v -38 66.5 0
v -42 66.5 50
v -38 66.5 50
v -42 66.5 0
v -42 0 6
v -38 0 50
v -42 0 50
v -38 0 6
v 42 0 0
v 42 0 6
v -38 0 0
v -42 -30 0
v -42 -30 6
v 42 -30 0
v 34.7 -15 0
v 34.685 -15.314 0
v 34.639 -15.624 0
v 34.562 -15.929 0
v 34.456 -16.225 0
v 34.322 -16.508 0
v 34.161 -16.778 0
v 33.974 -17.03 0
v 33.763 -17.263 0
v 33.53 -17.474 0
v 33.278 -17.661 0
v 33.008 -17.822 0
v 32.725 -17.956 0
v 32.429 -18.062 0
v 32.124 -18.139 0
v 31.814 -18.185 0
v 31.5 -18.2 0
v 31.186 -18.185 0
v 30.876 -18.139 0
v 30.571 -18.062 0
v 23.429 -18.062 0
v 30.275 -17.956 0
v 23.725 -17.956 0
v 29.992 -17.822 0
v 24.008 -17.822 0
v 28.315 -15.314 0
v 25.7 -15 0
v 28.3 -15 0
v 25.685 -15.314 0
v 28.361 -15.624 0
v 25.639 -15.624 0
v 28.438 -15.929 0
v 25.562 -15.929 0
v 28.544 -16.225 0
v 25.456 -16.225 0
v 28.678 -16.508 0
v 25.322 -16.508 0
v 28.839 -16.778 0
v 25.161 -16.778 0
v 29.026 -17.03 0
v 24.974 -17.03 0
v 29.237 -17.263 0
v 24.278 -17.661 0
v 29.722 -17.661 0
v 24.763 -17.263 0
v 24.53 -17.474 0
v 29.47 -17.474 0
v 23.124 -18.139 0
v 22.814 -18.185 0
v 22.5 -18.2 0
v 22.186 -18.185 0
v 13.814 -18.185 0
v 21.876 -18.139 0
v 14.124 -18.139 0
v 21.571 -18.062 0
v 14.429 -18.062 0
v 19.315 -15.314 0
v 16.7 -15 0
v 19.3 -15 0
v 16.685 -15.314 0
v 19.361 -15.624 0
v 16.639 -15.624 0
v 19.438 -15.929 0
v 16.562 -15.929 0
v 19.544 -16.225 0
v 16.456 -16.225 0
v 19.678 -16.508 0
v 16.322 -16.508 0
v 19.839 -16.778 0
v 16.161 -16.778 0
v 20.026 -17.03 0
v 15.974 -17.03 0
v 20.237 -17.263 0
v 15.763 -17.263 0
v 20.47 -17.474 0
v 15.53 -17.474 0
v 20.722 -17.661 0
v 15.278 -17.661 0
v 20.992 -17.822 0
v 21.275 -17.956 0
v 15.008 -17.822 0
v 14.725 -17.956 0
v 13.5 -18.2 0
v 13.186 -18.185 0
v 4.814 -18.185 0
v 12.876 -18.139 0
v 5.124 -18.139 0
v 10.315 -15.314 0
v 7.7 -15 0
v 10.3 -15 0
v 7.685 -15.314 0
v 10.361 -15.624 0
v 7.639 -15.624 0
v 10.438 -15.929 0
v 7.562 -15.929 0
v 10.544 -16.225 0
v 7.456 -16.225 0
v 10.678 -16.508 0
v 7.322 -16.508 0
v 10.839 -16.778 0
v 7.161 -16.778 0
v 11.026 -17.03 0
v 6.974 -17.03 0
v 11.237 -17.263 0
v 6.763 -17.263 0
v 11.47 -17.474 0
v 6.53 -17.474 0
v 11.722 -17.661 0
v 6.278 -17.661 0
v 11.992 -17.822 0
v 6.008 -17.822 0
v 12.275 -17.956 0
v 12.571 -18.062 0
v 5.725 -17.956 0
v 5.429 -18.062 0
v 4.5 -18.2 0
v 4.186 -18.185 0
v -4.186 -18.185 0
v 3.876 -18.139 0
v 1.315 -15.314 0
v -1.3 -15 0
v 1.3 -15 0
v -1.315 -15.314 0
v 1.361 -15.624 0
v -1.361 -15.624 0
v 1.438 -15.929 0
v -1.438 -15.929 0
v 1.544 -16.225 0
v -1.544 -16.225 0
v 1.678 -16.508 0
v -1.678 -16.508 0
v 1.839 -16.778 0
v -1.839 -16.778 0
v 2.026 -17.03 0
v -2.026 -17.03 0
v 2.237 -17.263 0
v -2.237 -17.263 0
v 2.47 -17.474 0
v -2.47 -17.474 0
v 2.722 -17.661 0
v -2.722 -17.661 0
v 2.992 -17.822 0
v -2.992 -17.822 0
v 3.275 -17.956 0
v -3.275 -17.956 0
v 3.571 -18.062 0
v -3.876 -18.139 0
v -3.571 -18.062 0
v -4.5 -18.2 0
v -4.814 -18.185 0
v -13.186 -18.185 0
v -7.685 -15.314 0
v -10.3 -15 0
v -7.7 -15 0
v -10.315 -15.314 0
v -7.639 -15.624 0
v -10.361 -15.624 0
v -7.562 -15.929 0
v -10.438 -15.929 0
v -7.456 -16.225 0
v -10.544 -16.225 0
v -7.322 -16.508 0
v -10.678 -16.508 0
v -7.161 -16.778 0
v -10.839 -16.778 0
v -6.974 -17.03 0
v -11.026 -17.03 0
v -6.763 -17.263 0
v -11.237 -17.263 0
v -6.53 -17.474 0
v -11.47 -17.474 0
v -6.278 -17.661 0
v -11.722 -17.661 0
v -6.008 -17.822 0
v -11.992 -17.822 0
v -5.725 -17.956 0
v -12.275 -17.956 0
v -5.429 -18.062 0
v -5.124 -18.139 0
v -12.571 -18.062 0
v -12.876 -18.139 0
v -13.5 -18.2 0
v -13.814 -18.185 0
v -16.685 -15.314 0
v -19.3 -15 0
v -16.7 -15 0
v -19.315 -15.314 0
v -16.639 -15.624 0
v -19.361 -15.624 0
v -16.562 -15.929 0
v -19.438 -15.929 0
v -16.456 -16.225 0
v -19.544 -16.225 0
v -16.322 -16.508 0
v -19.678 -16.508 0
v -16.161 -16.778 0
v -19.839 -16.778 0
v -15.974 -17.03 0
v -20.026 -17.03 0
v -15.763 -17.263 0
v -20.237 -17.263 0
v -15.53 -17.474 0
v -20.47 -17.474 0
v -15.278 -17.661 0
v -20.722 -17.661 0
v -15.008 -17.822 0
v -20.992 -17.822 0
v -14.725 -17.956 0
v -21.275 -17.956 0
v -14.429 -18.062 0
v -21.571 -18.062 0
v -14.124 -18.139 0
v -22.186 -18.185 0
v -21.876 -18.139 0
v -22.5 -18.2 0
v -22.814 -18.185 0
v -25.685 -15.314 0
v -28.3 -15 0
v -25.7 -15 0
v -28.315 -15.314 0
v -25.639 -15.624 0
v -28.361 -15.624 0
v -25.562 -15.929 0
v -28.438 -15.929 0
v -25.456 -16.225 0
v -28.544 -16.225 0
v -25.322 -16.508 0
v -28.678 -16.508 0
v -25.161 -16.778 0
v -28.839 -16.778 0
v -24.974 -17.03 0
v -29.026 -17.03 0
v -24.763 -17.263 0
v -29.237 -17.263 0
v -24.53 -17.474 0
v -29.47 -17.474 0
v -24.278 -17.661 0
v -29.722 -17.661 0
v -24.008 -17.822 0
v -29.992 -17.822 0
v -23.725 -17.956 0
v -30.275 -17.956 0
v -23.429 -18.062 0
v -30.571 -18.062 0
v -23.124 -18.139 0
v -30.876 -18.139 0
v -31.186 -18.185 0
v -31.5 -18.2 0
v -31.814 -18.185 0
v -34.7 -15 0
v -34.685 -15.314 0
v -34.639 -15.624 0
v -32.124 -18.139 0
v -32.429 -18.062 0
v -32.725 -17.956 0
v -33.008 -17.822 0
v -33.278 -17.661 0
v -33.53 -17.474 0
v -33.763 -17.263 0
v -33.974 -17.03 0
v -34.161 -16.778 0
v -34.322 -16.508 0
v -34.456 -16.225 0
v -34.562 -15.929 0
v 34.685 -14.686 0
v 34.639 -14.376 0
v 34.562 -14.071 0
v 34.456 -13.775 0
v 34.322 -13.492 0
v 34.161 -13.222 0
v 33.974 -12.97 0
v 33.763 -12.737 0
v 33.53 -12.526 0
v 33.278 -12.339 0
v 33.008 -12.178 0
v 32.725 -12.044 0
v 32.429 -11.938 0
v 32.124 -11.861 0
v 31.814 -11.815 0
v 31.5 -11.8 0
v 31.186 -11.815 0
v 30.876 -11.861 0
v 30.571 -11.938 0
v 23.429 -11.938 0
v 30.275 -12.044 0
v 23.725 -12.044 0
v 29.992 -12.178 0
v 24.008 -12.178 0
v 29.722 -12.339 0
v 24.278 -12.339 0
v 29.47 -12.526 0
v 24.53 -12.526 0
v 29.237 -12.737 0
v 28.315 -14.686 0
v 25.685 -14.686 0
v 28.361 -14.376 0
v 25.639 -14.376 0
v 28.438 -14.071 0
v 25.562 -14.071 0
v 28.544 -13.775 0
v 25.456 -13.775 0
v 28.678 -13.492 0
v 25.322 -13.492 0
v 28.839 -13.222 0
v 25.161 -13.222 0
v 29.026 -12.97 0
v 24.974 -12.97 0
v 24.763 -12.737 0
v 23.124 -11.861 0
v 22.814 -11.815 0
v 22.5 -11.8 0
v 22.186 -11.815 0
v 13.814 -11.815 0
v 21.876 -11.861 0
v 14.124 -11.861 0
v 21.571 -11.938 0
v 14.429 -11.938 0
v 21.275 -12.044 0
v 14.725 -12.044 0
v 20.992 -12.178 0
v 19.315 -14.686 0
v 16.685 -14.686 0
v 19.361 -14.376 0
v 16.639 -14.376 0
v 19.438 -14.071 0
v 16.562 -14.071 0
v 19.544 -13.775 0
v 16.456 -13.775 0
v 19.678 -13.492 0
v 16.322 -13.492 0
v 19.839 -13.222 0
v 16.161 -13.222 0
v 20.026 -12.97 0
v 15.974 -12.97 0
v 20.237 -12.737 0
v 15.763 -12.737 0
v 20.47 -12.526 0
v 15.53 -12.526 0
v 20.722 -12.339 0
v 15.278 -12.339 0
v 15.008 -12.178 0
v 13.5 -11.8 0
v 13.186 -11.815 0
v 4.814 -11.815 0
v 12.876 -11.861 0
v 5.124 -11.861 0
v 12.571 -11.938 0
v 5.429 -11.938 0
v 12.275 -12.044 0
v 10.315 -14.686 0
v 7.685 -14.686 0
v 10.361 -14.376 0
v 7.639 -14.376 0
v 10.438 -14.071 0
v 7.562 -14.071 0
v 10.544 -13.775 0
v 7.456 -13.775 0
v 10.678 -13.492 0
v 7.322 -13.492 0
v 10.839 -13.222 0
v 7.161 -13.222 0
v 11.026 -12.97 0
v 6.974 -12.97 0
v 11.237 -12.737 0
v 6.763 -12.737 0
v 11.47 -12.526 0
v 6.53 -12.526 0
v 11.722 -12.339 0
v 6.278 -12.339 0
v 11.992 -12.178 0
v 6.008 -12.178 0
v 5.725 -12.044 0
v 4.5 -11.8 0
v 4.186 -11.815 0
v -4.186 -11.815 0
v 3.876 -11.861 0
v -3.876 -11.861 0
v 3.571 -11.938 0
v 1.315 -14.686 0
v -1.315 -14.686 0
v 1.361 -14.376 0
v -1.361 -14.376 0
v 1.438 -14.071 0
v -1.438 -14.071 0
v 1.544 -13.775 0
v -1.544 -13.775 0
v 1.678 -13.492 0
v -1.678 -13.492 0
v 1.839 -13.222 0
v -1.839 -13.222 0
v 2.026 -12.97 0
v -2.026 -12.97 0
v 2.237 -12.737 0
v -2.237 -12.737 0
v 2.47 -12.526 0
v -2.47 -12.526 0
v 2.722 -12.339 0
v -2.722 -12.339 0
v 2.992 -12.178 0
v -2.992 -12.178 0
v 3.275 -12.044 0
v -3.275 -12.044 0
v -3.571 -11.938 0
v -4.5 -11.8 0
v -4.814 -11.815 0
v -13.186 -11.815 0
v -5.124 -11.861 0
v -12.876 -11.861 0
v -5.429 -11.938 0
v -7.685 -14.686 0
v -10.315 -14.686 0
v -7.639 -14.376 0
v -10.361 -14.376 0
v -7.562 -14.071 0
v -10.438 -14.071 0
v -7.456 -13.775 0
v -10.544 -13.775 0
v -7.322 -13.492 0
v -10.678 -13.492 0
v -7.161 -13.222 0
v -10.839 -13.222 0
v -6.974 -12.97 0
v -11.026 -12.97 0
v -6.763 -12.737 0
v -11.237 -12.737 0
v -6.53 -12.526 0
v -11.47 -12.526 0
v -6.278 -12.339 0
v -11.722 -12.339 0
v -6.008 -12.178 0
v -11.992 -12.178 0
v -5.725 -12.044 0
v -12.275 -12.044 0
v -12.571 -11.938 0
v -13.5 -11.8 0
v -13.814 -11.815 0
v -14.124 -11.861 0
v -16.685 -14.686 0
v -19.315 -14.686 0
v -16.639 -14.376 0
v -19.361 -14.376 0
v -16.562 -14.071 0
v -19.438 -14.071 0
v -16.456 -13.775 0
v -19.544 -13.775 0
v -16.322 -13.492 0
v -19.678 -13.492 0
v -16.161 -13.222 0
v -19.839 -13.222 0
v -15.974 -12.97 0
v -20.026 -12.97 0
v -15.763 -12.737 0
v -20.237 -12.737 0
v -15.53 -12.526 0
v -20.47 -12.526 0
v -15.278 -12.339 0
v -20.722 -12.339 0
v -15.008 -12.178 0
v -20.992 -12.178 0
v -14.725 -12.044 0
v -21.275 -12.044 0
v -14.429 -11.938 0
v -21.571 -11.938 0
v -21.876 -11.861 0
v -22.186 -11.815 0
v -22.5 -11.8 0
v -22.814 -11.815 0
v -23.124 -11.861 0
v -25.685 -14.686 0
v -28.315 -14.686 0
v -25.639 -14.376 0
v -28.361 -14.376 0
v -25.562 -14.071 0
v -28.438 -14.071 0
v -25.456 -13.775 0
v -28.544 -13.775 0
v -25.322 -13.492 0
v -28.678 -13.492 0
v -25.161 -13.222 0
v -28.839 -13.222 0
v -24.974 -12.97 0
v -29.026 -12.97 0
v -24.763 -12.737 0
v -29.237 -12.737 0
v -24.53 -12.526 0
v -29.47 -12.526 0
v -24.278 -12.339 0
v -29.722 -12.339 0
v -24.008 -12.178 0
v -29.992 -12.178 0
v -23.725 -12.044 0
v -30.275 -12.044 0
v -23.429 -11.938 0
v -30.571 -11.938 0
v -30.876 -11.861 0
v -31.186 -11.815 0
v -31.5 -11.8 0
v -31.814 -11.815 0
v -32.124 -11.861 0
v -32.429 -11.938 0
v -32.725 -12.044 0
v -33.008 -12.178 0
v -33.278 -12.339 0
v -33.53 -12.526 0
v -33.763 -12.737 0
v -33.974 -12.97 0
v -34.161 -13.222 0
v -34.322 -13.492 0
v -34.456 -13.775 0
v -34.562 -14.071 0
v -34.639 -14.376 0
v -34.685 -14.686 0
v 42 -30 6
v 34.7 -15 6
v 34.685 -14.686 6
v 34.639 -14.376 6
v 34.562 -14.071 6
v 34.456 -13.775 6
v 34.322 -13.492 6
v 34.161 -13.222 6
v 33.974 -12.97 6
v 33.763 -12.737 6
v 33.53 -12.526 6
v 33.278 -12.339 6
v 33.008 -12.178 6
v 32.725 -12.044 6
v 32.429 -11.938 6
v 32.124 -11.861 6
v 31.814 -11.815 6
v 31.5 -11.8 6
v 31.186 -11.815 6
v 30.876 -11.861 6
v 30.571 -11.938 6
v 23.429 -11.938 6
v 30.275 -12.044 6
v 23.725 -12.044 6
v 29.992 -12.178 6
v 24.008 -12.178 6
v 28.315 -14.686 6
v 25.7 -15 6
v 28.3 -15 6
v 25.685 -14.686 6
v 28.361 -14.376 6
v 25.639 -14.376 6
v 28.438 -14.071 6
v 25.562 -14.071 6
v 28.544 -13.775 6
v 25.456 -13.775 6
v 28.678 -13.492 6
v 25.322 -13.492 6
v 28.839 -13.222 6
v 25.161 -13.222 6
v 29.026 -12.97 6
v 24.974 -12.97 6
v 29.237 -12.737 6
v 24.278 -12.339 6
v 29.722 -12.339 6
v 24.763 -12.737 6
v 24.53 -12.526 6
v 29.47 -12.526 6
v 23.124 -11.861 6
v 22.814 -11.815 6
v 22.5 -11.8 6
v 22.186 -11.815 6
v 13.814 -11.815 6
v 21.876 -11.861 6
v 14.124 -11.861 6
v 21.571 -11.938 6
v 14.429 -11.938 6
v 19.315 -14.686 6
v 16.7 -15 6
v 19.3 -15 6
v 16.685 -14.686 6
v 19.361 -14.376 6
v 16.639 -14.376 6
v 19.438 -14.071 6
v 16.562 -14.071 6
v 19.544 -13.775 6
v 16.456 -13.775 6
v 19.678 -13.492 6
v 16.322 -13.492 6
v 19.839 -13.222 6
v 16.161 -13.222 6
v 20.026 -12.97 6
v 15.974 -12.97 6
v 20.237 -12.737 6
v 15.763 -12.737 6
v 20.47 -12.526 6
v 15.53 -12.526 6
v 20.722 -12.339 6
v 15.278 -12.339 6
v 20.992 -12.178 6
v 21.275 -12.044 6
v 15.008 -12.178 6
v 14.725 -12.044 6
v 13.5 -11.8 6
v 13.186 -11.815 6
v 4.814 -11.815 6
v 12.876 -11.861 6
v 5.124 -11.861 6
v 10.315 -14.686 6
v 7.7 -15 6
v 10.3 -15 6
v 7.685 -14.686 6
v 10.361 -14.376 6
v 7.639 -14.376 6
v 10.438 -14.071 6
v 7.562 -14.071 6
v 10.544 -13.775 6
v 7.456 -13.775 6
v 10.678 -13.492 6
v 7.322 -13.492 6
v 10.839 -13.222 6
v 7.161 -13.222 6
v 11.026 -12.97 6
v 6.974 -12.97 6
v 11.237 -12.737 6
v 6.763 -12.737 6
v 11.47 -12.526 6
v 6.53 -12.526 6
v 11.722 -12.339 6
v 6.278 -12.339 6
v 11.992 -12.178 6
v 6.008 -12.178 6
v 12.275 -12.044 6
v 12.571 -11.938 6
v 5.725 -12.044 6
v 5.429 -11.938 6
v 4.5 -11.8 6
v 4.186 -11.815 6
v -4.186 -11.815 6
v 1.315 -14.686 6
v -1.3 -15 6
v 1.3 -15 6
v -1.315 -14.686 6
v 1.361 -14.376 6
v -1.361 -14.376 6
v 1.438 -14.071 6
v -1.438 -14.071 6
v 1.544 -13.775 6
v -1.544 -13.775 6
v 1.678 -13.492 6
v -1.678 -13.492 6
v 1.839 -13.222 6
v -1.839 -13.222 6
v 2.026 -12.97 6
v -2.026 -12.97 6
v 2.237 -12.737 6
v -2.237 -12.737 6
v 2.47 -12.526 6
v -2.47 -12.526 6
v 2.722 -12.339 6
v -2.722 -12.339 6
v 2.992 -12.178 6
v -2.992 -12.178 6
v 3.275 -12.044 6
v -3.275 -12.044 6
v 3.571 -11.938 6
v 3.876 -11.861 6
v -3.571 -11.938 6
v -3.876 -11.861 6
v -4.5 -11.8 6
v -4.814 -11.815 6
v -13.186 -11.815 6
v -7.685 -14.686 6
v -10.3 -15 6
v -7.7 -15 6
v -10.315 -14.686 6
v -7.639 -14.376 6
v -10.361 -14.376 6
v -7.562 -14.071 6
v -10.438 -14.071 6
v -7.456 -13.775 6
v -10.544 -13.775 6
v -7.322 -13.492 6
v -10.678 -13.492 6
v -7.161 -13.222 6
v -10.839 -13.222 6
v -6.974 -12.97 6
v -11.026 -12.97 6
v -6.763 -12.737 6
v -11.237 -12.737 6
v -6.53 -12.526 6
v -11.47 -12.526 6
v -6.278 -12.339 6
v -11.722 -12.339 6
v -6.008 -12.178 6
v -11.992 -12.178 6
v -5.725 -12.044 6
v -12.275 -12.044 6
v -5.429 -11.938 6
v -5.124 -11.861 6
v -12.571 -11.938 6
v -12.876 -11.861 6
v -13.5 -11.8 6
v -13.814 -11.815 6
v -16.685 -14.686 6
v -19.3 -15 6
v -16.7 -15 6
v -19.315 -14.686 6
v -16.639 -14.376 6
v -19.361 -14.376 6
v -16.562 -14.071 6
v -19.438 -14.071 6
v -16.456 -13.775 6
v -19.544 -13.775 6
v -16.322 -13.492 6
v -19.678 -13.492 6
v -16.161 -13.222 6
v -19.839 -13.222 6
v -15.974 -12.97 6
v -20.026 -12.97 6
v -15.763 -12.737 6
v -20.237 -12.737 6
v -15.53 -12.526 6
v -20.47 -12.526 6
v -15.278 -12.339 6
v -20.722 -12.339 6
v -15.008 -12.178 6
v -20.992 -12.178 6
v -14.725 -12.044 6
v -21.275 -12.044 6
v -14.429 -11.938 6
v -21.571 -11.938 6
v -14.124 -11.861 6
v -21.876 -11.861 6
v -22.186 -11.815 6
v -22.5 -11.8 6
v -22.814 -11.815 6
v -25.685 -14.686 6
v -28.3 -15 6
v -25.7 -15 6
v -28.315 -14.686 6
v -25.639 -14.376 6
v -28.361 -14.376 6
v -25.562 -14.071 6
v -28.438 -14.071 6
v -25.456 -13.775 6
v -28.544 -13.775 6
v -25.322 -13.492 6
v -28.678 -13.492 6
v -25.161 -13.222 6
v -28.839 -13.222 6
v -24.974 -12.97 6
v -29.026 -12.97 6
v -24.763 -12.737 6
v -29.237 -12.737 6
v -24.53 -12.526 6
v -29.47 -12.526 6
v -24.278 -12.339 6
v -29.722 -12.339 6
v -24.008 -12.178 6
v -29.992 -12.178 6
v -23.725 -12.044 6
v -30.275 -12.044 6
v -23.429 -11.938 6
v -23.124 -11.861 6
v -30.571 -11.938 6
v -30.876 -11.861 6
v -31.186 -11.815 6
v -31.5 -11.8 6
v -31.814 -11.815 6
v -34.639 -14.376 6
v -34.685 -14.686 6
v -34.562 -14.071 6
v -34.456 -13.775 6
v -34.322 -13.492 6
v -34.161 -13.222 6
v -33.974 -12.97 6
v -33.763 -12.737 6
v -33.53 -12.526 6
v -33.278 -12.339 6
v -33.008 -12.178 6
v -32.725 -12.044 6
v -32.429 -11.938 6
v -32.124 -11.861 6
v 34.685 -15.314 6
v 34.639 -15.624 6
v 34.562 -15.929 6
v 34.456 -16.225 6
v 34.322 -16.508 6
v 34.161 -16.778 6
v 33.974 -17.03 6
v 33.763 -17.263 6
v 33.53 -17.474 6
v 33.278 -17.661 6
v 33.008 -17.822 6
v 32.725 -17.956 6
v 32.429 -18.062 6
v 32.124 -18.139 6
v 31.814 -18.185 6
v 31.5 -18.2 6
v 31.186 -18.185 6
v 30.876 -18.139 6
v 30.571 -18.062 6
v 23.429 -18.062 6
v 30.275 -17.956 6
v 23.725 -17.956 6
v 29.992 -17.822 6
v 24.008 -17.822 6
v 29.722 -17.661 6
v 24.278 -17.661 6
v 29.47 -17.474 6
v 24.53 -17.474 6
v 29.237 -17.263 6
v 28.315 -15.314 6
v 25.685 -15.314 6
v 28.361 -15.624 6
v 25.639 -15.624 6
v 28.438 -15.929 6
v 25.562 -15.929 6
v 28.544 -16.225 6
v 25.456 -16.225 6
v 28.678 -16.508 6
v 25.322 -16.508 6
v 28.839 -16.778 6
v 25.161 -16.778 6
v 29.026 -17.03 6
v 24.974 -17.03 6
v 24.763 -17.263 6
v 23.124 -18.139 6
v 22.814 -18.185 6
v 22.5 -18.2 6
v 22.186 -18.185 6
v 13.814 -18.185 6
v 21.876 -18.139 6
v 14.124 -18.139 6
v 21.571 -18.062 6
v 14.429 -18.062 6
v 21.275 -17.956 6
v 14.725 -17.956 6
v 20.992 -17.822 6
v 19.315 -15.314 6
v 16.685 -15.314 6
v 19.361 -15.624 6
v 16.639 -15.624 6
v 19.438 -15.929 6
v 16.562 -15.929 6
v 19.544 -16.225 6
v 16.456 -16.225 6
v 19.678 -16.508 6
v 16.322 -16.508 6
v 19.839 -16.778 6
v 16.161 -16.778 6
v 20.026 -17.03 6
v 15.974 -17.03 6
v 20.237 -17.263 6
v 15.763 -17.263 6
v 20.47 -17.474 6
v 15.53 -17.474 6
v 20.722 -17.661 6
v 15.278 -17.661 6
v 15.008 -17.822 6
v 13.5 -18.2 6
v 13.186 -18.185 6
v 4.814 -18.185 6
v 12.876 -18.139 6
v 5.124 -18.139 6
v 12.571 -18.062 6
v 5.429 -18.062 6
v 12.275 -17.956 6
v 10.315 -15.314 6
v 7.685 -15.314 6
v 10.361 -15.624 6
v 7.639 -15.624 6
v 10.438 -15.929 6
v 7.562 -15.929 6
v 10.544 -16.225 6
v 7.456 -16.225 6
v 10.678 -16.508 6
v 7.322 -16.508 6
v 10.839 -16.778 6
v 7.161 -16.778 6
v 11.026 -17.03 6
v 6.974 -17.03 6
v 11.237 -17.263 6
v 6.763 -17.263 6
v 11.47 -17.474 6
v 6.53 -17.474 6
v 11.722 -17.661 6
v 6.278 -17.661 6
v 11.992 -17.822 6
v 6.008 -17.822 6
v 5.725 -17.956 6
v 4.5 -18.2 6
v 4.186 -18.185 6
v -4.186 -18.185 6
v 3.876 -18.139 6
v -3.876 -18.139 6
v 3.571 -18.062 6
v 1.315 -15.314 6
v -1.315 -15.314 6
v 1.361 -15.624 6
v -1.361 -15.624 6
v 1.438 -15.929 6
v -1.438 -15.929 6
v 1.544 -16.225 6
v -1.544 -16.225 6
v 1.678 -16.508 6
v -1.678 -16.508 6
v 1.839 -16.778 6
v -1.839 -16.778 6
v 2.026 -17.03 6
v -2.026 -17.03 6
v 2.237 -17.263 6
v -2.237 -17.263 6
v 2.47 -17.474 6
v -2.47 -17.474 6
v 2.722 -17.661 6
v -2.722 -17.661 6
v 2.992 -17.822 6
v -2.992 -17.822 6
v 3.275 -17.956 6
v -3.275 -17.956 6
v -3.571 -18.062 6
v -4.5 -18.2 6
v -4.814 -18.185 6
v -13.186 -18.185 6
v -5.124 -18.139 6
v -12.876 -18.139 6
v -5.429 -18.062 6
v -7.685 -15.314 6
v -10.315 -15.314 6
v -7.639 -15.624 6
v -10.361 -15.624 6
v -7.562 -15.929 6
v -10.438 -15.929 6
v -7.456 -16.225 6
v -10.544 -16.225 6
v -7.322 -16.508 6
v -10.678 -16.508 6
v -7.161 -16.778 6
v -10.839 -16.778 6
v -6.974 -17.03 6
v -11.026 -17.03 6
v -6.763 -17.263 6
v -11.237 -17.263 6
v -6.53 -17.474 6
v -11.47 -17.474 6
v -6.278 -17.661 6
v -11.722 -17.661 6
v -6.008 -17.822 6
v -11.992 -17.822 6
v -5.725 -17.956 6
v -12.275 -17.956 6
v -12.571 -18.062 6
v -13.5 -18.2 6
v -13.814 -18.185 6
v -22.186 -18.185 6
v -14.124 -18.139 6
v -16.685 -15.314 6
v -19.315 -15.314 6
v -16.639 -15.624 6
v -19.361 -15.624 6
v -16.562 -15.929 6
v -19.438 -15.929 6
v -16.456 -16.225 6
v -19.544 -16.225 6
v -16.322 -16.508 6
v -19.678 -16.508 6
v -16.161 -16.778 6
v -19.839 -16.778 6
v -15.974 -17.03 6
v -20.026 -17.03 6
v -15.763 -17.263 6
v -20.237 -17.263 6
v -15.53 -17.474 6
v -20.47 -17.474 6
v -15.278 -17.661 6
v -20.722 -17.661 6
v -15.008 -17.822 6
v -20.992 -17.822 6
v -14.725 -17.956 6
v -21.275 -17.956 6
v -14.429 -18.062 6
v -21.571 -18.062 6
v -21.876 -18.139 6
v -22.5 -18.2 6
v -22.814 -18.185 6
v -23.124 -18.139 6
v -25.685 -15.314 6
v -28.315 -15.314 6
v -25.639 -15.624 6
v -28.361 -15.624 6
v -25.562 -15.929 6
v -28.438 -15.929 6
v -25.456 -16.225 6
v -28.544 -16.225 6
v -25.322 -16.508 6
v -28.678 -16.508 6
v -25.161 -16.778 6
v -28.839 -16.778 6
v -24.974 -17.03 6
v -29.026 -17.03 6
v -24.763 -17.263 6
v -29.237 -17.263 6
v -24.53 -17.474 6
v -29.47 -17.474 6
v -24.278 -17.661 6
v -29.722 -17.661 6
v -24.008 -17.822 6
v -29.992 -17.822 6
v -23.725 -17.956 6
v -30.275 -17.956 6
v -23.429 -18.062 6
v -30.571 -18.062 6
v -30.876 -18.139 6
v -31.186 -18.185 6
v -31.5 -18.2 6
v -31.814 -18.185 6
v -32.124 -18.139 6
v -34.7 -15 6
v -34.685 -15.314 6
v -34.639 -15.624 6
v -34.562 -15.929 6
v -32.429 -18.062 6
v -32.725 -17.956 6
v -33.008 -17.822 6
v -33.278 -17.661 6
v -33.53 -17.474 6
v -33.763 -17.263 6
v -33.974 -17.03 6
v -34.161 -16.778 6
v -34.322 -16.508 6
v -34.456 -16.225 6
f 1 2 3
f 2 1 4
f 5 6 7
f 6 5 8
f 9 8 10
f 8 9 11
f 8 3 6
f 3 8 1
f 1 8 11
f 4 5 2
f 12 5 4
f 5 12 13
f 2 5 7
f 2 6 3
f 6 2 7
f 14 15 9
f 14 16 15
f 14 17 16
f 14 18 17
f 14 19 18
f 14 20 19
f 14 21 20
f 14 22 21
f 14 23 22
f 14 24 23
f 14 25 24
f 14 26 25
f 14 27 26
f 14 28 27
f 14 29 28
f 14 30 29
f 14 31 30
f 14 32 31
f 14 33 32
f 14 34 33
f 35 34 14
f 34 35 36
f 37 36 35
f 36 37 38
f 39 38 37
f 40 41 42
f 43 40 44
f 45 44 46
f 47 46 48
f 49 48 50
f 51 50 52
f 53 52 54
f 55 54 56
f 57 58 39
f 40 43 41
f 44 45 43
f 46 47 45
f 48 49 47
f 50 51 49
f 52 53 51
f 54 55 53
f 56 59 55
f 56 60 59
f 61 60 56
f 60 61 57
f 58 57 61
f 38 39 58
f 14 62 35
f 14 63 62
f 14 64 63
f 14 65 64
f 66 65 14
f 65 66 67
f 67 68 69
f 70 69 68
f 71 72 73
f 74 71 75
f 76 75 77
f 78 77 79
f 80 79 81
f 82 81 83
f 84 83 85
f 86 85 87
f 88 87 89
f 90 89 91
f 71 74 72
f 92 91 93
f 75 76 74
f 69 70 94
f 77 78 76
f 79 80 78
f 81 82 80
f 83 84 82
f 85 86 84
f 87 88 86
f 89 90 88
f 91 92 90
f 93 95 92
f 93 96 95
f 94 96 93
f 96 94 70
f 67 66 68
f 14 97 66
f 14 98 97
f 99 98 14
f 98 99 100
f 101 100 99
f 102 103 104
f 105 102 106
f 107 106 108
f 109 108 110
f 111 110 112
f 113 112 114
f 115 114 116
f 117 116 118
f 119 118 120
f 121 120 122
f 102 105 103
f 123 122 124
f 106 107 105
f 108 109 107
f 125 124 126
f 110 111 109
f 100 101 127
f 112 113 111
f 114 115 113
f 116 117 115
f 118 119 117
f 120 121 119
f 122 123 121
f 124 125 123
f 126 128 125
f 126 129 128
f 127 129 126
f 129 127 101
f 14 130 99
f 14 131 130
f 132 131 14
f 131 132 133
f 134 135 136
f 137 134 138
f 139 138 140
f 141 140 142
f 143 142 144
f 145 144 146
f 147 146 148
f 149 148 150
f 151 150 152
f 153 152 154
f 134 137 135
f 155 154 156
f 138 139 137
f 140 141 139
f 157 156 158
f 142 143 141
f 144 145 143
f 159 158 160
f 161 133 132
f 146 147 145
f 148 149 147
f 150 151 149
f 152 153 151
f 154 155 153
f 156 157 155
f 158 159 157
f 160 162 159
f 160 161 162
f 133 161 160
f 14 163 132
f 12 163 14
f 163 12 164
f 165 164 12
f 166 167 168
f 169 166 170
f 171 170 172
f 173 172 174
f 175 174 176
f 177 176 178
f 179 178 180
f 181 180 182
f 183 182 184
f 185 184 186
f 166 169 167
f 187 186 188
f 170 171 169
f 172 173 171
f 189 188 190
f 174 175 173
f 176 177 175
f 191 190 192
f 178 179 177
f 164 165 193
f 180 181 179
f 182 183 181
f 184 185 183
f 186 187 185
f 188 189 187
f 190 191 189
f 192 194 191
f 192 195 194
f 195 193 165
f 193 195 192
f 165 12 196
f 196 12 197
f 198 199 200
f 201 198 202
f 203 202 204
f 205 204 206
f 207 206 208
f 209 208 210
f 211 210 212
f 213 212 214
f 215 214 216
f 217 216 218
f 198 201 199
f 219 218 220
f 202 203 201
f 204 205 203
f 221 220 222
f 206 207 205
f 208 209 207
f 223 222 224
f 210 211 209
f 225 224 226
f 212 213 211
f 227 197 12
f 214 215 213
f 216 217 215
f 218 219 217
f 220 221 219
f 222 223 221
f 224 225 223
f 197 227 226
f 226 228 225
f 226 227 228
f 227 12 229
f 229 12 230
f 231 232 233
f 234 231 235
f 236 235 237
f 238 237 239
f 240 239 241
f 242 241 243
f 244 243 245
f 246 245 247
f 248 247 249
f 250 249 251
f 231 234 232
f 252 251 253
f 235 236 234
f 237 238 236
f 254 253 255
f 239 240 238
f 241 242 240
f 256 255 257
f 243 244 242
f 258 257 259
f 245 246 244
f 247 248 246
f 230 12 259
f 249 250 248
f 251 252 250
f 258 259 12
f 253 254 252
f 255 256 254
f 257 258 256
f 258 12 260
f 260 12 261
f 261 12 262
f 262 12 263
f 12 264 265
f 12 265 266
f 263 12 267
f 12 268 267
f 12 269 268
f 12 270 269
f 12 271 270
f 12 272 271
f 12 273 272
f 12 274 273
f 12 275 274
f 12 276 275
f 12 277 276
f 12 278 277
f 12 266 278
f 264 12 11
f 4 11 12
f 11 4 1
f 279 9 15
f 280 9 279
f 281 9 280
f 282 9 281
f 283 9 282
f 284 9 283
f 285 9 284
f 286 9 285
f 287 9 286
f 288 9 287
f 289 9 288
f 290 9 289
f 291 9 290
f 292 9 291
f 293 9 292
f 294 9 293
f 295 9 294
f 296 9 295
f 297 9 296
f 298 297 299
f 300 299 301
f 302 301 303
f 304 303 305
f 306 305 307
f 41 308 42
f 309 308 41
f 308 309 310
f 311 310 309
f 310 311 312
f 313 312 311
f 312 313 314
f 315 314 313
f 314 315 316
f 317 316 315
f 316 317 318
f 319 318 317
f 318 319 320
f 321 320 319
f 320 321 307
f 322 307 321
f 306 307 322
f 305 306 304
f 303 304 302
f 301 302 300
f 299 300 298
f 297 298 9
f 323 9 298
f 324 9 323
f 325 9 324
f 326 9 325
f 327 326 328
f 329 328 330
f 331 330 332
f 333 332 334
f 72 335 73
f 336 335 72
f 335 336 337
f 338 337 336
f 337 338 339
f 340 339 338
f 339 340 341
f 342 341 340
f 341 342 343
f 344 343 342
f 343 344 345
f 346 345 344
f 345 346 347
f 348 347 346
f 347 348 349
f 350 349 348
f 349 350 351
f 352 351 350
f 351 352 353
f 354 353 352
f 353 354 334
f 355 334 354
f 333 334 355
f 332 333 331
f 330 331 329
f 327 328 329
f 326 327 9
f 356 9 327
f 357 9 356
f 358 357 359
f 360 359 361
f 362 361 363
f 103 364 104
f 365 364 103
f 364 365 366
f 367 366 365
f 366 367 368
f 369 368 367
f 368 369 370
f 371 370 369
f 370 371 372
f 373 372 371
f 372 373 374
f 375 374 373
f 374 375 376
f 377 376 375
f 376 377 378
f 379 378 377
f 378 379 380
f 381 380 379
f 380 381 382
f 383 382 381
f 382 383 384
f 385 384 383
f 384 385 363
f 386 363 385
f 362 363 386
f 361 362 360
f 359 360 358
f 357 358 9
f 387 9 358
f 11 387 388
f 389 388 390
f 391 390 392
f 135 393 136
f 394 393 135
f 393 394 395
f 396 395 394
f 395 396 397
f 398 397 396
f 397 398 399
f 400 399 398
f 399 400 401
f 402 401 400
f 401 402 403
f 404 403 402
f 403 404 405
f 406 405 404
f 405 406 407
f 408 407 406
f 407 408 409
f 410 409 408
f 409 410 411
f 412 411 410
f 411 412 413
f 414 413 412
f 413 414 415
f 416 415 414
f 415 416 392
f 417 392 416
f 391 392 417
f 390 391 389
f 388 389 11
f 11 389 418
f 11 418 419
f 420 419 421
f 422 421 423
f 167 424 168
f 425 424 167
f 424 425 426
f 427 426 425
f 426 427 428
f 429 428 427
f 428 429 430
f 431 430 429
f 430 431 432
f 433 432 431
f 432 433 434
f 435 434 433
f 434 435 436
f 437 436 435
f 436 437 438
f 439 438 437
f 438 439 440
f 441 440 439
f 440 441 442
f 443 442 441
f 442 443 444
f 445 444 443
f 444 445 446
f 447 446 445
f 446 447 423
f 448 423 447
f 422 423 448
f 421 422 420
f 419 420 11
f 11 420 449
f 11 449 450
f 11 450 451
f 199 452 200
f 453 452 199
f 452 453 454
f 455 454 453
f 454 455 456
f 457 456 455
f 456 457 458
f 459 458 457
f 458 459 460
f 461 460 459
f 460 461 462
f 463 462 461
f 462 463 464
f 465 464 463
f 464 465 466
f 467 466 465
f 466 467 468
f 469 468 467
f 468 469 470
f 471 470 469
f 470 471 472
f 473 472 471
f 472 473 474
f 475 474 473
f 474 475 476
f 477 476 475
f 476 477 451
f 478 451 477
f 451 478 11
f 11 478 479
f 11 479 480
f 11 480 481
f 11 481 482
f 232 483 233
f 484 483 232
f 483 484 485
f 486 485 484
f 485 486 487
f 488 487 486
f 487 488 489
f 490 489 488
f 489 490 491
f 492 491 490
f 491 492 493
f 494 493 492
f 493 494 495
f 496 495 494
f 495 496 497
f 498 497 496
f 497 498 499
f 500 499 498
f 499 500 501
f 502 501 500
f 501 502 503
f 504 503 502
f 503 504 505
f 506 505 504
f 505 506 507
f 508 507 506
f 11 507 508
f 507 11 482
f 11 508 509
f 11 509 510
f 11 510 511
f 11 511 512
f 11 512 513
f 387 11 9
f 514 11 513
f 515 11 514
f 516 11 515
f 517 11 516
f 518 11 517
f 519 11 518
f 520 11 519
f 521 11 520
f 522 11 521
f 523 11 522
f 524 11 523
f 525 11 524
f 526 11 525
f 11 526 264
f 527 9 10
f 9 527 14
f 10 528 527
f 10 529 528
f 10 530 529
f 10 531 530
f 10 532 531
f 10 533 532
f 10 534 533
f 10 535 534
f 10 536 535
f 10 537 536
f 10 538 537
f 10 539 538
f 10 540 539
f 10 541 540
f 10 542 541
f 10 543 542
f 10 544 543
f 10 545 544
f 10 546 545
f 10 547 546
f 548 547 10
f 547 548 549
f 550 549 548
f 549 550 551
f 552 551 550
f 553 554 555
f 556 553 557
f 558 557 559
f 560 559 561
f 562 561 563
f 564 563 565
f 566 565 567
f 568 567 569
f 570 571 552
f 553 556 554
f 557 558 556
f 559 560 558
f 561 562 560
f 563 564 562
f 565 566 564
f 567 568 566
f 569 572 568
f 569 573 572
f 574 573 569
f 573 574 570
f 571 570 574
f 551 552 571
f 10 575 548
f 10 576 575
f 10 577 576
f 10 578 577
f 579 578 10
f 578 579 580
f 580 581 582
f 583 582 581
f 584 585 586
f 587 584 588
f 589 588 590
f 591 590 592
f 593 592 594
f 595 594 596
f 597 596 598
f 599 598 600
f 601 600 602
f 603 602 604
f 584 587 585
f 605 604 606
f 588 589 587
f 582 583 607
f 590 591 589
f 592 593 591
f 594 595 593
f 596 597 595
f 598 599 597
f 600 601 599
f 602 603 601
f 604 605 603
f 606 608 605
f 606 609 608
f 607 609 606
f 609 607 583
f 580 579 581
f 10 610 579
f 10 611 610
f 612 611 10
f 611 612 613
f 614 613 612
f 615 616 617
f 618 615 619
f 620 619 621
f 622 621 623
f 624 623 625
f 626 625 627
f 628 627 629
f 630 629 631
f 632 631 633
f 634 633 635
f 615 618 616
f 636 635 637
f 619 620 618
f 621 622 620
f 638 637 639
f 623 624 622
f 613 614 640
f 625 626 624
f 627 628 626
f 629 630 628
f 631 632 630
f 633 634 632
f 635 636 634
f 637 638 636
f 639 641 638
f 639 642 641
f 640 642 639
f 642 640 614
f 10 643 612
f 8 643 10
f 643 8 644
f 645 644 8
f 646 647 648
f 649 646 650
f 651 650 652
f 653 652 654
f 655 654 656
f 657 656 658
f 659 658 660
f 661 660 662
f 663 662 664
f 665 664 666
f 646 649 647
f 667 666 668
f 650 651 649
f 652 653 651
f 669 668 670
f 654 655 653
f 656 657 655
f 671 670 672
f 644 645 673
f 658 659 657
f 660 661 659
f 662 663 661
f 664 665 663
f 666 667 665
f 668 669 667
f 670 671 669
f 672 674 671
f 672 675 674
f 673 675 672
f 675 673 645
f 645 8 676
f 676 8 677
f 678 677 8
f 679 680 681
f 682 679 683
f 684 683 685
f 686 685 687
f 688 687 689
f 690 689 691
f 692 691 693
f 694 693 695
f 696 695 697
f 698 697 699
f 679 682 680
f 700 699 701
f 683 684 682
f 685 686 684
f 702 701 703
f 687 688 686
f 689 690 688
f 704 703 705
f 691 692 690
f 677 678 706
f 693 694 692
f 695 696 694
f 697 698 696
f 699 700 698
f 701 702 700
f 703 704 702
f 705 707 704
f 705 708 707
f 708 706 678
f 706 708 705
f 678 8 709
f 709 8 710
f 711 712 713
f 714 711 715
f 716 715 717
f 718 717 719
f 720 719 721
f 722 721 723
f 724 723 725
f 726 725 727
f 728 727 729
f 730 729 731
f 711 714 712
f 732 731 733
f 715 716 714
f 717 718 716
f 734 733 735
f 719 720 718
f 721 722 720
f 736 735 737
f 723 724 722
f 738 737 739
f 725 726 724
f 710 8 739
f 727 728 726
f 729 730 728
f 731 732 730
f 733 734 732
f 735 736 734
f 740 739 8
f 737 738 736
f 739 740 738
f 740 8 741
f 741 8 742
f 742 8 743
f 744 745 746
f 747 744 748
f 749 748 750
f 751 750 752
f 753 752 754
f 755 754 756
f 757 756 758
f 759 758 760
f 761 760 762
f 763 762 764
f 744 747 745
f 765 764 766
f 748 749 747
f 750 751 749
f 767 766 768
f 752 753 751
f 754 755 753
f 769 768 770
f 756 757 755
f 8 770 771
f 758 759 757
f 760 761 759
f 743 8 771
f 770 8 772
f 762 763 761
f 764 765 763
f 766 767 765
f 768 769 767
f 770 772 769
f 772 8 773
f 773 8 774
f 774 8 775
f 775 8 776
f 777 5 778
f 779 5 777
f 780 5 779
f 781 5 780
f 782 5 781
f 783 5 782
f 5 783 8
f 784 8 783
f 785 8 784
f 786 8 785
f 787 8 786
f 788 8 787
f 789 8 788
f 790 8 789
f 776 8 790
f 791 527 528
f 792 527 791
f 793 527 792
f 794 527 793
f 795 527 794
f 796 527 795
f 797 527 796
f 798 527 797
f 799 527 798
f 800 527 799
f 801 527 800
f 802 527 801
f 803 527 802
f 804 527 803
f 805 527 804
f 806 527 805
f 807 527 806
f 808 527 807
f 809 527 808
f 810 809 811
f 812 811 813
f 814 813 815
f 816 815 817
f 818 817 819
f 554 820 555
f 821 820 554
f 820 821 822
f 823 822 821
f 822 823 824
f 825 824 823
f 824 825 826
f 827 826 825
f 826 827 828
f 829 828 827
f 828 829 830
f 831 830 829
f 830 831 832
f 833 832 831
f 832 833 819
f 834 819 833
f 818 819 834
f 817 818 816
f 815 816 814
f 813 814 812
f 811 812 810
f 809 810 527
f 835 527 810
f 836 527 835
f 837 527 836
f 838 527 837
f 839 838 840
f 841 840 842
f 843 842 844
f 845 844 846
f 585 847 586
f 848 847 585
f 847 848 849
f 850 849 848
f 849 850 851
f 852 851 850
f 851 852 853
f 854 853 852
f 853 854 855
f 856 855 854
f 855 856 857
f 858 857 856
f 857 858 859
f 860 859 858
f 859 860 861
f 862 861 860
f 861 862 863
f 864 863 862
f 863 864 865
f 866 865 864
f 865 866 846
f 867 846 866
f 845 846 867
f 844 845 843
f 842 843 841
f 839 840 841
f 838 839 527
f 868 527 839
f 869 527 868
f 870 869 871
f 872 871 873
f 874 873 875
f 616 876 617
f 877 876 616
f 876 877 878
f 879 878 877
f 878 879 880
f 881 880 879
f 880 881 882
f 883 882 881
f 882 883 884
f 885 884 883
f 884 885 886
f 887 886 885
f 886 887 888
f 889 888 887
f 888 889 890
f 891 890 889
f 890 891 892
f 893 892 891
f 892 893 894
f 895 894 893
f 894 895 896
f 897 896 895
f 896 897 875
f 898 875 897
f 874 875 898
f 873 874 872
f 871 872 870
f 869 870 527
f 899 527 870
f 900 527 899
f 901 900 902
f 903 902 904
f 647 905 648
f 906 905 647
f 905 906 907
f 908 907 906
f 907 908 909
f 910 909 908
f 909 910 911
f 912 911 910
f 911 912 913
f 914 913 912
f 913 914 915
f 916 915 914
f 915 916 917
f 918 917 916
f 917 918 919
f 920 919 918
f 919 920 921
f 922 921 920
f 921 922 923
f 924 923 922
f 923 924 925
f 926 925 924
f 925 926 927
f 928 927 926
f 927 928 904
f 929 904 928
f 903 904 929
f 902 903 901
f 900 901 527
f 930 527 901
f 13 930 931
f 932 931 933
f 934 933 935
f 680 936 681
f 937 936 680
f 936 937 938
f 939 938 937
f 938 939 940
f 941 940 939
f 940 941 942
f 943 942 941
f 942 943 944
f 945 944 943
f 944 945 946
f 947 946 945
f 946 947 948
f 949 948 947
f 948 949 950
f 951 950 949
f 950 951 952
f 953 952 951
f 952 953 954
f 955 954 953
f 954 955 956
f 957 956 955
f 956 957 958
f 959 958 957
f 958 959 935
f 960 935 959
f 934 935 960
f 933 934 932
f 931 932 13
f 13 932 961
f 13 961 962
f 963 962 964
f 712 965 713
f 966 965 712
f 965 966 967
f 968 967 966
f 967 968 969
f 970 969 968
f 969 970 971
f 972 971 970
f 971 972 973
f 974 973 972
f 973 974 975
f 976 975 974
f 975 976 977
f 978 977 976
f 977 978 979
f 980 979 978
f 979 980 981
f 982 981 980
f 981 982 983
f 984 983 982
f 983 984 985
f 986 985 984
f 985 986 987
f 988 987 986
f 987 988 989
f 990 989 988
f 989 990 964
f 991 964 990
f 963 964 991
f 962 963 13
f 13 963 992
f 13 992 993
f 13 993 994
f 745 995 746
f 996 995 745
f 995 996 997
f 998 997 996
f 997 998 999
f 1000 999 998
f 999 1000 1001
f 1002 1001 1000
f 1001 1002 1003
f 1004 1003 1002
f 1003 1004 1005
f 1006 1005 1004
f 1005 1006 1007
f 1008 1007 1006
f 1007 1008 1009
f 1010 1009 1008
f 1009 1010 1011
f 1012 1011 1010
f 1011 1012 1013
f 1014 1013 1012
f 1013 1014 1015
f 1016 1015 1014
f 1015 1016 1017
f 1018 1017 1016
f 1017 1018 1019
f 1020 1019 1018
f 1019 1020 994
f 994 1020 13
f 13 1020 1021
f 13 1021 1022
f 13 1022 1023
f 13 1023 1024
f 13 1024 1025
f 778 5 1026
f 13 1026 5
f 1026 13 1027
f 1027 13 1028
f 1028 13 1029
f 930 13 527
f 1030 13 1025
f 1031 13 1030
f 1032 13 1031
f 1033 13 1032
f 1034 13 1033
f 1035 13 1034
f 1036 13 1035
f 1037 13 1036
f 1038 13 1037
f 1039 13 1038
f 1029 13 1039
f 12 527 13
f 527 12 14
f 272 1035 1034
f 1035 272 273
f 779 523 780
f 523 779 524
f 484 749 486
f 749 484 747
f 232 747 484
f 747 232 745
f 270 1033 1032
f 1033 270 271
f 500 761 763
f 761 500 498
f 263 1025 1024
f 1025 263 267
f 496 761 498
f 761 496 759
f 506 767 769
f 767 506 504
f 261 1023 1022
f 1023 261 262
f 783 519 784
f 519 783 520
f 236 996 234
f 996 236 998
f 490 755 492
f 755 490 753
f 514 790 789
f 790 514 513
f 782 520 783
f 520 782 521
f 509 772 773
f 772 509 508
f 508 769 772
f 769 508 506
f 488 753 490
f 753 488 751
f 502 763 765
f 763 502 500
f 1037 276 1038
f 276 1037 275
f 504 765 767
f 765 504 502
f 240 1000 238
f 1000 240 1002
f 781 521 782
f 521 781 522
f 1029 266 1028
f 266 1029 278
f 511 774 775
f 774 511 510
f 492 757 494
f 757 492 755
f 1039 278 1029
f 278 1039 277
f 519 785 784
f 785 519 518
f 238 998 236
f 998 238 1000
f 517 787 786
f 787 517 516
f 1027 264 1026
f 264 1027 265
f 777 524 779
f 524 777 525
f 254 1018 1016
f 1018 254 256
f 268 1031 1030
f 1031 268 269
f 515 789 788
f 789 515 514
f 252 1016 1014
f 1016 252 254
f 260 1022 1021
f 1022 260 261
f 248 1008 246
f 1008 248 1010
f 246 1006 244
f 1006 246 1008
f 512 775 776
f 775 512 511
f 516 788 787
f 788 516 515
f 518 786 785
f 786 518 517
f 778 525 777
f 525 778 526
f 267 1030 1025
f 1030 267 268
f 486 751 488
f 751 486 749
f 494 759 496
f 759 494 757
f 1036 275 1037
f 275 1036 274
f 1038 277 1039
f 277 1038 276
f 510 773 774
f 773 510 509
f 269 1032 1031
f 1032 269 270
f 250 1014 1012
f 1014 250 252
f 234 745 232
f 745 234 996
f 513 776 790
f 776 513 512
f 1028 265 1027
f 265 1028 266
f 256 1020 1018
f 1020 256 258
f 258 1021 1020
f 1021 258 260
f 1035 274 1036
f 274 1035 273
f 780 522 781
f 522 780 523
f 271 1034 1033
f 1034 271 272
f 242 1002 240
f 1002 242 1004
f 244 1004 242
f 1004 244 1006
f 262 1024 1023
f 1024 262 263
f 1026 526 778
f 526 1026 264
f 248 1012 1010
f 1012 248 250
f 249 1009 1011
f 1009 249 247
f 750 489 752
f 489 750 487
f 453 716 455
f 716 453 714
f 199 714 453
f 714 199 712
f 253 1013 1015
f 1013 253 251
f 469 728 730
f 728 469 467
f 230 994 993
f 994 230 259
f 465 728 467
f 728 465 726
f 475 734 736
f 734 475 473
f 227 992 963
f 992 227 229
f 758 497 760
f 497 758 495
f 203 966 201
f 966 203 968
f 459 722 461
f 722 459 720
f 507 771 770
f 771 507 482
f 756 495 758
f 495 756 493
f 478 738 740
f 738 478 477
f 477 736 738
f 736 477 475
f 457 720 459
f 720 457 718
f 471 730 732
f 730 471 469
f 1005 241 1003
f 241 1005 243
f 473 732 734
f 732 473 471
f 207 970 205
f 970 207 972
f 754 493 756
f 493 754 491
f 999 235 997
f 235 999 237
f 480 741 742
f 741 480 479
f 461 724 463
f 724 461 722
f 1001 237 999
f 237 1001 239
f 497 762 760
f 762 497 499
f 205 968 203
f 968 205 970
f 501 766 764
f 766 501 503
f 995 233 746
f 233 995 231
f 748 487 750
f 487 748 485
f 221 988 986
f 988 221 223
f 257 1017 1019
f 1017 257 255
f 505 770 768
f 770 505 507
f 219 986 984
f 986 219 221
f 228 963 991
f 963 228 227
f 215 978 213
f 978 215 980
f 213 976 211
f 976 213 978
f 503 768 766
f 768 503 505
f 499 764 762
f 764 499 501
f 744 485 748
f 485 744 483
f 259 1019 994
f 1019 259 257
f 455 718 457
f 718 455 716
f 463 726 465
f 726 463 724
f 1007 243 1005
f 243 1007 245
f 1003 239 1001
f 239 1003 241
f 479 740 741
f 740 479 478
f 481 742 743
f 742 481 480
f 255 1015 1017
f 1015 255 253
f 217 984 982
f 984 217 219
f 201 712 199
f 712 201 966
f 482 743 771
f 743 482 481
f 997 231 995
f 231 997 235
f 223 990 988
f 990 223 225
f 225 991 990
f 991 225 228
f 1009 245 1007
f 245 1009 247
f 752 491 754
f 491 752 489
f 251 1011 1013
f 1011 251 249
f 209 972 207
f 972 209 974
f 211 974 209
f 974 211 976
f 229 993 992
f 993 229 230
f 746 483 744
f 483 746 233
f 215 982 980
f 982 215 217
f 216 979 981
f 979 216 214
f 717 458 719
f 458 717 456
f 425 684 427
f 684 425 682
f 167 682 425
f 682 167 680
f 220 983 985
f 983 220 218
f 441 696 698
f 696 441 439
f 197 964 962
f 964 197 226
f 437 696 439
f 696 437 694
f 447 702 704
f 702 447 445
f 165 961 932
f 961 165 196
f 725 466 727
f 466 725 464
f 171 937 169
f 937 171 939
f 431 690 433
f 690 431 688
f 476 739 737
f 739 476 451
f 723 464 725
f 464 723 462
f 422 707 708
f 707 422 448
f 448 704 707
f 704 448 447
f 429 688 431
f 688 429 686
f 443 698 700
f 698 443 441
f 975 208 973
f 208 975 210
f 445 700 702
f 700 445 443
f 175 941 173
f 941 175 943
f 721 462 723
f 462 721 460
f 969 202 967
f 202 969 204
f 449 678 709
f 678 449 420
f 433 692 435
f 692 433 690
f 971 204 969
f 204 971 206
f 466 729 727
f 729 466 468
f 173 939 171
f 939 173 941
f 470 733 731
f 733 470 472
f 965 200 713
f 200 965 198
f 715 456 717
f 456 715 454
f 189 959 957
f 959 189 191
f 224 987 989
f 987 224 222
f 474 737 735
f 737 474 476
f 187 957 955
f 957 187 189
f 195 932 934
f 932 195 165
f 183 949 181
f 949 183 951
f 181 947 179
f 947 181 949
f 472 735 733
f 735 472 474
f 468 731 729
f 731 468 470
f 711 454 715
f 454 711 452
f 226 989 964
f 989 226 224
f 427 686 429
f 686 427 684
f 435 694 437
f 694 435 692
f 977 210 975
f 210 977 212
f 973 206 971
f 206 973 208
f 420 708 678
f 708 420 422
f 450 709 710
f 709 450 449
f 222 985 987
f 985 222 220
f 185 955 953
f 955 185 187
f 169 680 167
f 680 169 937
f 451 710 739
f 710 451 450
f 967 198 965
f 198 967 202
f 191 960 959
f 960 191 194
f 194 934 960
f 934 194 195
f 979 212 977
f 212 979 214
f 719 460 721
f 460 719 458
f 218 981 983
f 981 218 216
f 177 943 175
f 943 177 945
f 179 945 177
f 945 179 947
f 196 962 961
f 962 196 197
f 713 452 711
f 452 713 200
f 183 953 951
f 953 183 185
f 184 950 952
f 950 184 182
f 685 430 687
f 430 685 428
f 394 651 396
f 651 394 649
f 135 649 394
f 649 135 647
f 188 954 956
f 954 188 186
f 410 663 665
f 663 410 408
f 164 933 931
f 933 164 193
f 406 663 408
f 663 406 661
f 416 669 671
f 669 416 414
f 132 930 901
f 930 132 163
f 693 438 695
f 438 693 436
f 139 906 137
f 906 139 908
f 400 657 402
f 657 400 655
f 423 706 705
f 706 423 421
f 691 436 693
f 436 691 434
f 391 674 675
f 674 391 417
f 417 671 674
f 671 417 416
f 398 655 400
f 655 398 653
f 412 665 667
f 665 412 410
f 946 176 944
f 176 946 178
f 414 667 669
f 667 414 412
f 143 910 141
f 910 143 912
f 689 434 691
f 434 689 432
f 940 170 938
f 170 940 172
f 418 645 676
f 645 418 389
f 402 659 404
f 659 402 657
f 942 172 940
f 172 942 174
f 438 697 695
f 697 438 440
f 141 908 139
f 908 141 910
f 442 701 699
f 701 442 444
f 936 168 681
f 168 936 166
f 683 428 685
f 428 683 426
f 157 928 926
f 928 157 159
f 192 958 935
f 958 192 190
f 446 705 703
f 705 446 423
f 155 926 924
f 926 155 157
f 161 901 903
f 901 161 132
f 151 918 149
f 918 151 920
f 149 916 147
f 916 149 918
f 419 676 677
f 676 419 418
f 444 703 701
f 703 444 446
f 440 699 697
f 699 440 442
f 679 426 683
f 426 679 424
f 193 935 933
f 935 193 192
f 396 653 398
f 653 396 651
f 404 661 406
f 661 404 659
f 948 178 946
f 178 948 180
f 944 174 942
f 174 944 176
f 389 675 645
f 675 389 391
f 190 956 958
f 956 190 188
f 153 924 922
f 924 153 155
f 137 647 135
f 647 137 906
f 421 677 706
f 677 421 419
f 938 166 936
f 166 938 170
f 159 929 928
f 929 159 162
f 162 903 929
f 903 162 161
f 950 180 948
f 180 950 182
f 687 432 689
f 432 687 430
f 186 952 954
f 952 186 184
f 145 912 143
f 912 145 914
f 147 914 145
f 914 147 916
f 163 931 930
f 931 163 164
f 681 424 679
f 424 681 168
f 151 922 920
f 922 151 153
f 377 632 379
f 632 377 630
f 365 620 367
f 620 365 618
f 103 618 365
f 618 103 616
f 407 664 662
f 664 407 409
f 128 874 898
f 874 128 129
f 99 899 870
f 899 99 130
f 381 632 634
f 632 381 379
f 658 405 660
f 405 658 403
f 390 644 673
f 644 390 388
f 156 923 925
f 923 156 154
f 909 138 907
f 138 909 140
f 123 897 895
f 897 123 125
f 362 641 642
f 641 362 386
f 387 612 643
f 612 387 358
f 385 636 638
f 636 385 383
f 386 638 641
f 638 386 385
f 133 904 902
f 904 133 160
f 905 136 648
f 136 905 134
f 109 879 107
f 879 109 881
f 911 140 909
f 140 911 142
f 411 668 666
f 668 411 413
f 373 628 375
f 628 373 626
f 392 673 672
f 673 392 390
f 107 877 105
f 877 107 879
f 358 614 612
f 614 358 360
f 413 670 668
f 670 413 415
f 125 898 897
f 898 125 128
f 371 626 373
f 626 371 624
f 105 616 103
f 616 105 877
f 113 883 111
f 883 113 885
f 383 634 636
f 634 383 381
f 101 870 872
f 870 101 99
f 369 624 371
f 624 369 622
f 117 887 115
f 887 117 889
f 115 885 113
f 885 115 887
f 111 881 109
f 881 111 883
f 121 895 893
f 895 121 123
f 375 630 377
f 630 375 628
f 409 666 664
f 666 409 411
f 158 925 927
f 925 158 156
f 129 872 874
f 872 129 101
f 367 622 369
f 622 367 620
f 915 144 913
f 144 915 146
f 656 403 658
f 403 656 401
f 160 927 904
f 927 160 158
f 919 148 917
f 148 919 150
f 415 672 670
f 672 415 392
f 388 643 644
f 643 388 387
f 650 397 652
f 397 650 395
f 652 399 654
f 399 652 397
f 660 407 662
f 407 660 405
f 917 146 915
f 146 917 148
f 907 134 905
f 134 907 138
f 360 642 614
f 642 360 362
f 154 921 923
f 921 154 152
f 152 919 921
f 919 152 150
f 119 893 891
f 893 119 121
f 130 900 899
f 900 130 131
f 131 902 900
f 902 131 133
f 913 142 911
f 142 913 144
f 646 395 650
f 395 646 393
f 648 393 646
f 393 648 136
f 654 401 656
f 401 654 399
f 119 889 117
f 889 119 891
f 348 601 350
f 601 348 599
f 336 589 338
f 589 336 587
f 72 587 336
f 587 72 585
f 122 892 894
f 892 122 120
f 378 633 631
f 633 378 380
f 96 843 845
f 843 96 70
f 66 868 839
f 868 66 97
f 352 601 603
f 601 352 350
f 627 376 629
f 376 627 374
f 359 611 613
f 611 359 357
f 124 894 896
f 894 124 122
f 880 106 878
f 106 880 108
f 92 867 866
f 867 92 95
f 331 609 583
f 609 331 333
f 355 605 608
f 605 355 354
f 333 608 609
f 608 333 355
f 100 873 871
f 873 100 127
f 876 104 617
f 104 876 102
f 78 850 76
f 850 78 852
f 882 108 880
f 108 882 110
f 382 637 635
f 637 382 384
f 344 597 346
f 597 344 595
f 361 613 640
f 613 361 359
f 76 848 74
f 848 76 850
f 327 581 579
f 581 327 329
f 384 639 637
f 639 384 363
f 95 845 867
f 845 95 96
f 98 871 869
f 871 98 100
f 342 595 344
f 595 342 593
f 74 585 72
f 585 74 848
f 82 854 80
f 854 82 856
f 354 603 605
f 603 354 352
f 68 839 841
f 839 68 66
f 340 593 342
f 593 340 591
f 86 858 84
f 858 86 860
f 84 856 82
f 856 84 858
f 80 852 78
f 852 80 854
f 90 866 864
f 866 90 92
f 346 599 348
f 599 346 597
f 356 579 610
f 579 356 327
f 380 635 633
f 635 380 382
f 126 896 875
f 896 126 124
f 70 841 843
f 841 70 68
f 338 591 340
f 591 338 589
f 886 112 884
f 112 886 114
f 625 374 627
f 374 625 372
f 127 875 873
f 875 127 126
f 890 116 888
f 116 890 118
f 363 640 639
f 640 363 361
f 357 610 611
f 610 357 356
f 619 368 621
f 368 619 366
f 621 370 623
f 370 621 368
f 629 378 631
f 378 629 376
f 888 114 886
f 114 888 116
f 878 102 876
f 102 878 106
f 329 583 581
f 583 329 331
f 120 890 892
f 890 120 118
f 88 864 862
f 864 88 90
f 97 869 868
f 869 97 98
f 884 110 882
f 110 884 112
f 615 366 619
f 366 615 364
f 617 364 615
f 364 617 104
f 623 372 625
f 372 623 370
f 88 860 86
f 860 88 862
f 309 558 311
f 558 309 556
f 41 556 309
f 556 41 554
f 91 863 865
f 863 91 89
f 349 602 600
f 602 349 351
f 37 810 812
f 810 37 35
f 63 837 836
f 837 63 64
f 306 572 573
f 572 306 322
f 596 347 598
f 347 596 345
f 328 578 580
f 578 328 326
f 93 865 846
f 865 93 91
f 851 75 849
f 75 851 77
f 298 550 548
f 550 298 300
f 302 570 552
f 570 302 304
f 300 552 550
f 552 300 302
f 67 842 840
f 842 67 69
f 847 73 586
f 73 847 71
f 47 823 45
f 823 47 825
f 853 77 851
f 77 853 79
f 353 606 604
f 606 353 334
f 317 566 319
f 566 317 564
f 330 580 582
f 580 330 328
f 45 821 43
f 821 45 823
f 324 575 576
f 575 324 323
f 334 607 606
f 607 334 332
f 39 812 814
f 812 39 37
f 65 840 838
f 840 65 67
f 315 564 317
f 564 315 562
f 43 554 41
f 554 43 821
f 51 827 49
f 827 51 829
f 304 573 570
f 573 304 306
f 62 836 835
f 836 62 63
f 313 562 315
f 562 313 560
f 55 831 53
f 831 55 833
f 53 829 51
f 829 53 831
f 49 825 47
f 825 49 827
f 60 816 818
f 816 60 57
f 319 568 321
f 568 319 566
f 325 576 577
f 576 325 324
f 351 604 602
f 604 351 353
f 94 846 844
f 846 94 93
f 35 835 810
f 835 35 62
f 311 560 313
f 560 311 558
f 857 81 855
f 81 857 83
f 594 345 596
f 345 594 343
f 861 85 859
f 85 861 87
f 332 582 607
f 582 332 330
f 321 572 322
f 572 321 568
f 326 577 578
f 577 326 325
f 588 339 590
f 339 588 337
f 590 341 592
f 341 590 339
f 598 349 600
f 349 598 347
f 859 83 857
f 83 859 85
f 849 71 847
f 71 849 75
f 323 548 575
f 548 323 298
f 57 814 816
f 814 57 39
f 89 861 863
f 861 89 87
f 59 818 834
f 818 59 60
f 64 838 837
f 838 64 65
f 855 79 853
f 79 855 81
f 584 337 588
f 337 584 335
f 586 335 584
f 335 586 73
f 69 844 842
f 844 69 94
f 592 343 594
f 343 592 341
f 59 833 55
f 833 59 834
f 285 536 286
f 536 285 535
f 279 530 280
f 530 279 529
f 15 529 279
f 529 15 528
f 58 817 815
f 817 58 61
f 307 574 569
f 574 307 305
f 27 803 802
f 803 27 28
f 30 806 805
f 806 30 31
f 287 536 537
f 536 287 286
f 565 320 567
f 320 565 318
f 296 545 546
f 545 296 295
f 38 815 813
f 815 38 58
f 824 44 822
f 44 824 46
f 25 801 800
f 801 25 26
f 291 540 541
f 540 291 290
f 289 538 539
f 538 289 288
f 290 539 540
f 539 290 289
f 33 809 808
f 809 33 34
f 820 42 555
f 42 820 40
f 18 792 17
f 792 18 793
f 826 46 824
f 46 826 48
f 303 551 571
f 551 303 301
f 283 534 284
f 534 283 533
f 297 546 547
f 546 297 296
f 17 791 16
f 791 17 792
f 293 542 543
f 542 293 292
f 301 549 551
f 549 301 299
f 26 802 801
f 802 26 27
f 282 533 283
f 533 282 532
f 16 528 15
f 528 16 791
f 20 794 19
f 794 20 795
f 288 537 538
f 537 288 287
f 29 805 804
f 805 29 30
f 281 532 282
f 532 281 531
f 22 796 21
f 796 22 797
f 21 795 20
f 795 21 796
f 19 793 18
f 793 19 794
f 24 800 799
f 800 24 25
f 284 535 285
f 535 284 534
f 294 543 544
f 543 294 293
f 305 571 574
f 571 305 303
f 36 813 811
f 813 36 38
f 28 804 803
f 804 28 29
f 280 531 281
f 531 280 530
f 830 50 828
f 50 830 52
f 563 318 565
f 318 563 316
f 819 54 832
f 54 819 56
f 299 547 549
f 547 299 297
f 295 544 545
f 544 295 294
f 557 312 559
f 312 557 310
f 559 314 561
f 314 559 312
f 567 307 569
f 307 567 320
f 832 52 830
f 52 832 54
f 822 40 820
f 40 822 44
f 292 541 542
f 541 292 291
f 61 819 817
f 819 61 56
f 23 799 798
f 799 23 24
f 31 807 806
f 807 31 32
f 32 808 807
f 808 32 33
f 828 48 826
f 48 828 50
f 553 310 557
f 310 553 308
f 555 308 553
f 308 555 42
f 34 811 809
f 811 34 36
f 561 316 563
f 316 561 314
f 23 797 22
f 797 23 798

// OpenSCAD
// --- Dimensions ---
// Overall extrusion length along X
length_x = 84; 

// Wall thickness gap (target 12.5mm)
// Inner leg ends at y=4, Outer leg starts at y=16.5. 
// 16.5 - 4 = 12.5. Correct.
gap_width = 12.5; 

// Leg dimensions
leg_thickness = 4; // User: "inner leg (y = 0 to 4)"
leg_height = 50;

// Bridge dimensions
// User: "joined at the top by a bridge from z = 46 to 50"
bridge_z_start = 46;

// Ledge dimensions
// User: "ledge, 6 mm thick (z = 0 to 6) reaches toward -Y from y = 0 to y = -30"
ledge_thickness = 6;
ledge_depth = 30; 

// Tube hole dimensions
// User: "Eight vertical 6.4 mm through-holes in the ledge... 9 mm apart along X, centred, at y = -15"
hole_diameter = 6.4;
hole_y_pos = -15;
hole_spacing_x = 9;
num_holes = 8;

// --- Parameters ---
$fn = 64;

// --- Modeling ---

// The part is centered on X and Y, resting on Z=0
// The profile is defined in the YZ plane and extruded along X

module profile_extrusion() {
    // We build the U-shape profile and extrude it along X
    // The profile is defined in the YZ plane
    linear_extrude(height = leg_height) {
        union() {
            // Inner Leg: y = 0 to 4, z = 0 to 50
            square([leg_thickness, leg_height]);
            
            // Outer Leg: y = 16.5 to 20.5, z = 0 to 50
            translate([0, 16.5])
                square([leg_thickness, leg_height]);
            
            // Bridge: z = 46 to 50
            // User: "joined at the top by a bridge from z = 46 to 50"
            // This bridge connects the two legs.
            // To ensure it is a single solid, we bridge from y=0 to y=20.5
            translate([0, 0])
                square([leg_thickness, 20.5]);
        }
    }
}

// Final Assembly
// We use difference() to subtract the holes from the union of the body and ledge
difference() {
    union() {
        // 1. The U-profile extruded along X
        // Centered on X: from -42 to 42.
        // The profile starts at y=0.
        translate([-length_x/2, 0, 0])
            profile_extrusion();

        // 2. The Ledge
        // "reaches toward -Y from y = 0 to y = -30"
        // "6 mm thick (z = 0 to 6)"
        // "84 mm long"
        translate([-length_x/2, -ledge_depth, 0])
            cube([length_x, ledge_depth, ledge_thickness]);
    }

    // 3. The Tube Holes
    // "Eight vertical 6.4 mm through-holes in the ledge"
    // "9 mm apart along X, centred, at y = -15"
    // Total span of holes: (8-1) * 9 = 63mm.
    // To center 63mm on X=0: start at -31.5, end at 31.5.
    for (i = [0 : num_holes - 1]) {
        x_pos = -31.5 + (i * hole_spacing_x);
        
        // Subtracting from the ledge
        // We extend the cylinder slightly in Z to ensure a clean cut through the ledge
        translate([x_pos, hole_y_pos, -0.01]) 
            cylinder(h = ledge_thickness + 0.02, d = hole_diameter);
    }
}

// Verification of bounding box logic:
// X: -42 to 42 (Size 84)
// Y: -30 (ledge) to 20.5 (outer leg) (Size 50.5)
// Z: 0 to 50 (Size 50)
